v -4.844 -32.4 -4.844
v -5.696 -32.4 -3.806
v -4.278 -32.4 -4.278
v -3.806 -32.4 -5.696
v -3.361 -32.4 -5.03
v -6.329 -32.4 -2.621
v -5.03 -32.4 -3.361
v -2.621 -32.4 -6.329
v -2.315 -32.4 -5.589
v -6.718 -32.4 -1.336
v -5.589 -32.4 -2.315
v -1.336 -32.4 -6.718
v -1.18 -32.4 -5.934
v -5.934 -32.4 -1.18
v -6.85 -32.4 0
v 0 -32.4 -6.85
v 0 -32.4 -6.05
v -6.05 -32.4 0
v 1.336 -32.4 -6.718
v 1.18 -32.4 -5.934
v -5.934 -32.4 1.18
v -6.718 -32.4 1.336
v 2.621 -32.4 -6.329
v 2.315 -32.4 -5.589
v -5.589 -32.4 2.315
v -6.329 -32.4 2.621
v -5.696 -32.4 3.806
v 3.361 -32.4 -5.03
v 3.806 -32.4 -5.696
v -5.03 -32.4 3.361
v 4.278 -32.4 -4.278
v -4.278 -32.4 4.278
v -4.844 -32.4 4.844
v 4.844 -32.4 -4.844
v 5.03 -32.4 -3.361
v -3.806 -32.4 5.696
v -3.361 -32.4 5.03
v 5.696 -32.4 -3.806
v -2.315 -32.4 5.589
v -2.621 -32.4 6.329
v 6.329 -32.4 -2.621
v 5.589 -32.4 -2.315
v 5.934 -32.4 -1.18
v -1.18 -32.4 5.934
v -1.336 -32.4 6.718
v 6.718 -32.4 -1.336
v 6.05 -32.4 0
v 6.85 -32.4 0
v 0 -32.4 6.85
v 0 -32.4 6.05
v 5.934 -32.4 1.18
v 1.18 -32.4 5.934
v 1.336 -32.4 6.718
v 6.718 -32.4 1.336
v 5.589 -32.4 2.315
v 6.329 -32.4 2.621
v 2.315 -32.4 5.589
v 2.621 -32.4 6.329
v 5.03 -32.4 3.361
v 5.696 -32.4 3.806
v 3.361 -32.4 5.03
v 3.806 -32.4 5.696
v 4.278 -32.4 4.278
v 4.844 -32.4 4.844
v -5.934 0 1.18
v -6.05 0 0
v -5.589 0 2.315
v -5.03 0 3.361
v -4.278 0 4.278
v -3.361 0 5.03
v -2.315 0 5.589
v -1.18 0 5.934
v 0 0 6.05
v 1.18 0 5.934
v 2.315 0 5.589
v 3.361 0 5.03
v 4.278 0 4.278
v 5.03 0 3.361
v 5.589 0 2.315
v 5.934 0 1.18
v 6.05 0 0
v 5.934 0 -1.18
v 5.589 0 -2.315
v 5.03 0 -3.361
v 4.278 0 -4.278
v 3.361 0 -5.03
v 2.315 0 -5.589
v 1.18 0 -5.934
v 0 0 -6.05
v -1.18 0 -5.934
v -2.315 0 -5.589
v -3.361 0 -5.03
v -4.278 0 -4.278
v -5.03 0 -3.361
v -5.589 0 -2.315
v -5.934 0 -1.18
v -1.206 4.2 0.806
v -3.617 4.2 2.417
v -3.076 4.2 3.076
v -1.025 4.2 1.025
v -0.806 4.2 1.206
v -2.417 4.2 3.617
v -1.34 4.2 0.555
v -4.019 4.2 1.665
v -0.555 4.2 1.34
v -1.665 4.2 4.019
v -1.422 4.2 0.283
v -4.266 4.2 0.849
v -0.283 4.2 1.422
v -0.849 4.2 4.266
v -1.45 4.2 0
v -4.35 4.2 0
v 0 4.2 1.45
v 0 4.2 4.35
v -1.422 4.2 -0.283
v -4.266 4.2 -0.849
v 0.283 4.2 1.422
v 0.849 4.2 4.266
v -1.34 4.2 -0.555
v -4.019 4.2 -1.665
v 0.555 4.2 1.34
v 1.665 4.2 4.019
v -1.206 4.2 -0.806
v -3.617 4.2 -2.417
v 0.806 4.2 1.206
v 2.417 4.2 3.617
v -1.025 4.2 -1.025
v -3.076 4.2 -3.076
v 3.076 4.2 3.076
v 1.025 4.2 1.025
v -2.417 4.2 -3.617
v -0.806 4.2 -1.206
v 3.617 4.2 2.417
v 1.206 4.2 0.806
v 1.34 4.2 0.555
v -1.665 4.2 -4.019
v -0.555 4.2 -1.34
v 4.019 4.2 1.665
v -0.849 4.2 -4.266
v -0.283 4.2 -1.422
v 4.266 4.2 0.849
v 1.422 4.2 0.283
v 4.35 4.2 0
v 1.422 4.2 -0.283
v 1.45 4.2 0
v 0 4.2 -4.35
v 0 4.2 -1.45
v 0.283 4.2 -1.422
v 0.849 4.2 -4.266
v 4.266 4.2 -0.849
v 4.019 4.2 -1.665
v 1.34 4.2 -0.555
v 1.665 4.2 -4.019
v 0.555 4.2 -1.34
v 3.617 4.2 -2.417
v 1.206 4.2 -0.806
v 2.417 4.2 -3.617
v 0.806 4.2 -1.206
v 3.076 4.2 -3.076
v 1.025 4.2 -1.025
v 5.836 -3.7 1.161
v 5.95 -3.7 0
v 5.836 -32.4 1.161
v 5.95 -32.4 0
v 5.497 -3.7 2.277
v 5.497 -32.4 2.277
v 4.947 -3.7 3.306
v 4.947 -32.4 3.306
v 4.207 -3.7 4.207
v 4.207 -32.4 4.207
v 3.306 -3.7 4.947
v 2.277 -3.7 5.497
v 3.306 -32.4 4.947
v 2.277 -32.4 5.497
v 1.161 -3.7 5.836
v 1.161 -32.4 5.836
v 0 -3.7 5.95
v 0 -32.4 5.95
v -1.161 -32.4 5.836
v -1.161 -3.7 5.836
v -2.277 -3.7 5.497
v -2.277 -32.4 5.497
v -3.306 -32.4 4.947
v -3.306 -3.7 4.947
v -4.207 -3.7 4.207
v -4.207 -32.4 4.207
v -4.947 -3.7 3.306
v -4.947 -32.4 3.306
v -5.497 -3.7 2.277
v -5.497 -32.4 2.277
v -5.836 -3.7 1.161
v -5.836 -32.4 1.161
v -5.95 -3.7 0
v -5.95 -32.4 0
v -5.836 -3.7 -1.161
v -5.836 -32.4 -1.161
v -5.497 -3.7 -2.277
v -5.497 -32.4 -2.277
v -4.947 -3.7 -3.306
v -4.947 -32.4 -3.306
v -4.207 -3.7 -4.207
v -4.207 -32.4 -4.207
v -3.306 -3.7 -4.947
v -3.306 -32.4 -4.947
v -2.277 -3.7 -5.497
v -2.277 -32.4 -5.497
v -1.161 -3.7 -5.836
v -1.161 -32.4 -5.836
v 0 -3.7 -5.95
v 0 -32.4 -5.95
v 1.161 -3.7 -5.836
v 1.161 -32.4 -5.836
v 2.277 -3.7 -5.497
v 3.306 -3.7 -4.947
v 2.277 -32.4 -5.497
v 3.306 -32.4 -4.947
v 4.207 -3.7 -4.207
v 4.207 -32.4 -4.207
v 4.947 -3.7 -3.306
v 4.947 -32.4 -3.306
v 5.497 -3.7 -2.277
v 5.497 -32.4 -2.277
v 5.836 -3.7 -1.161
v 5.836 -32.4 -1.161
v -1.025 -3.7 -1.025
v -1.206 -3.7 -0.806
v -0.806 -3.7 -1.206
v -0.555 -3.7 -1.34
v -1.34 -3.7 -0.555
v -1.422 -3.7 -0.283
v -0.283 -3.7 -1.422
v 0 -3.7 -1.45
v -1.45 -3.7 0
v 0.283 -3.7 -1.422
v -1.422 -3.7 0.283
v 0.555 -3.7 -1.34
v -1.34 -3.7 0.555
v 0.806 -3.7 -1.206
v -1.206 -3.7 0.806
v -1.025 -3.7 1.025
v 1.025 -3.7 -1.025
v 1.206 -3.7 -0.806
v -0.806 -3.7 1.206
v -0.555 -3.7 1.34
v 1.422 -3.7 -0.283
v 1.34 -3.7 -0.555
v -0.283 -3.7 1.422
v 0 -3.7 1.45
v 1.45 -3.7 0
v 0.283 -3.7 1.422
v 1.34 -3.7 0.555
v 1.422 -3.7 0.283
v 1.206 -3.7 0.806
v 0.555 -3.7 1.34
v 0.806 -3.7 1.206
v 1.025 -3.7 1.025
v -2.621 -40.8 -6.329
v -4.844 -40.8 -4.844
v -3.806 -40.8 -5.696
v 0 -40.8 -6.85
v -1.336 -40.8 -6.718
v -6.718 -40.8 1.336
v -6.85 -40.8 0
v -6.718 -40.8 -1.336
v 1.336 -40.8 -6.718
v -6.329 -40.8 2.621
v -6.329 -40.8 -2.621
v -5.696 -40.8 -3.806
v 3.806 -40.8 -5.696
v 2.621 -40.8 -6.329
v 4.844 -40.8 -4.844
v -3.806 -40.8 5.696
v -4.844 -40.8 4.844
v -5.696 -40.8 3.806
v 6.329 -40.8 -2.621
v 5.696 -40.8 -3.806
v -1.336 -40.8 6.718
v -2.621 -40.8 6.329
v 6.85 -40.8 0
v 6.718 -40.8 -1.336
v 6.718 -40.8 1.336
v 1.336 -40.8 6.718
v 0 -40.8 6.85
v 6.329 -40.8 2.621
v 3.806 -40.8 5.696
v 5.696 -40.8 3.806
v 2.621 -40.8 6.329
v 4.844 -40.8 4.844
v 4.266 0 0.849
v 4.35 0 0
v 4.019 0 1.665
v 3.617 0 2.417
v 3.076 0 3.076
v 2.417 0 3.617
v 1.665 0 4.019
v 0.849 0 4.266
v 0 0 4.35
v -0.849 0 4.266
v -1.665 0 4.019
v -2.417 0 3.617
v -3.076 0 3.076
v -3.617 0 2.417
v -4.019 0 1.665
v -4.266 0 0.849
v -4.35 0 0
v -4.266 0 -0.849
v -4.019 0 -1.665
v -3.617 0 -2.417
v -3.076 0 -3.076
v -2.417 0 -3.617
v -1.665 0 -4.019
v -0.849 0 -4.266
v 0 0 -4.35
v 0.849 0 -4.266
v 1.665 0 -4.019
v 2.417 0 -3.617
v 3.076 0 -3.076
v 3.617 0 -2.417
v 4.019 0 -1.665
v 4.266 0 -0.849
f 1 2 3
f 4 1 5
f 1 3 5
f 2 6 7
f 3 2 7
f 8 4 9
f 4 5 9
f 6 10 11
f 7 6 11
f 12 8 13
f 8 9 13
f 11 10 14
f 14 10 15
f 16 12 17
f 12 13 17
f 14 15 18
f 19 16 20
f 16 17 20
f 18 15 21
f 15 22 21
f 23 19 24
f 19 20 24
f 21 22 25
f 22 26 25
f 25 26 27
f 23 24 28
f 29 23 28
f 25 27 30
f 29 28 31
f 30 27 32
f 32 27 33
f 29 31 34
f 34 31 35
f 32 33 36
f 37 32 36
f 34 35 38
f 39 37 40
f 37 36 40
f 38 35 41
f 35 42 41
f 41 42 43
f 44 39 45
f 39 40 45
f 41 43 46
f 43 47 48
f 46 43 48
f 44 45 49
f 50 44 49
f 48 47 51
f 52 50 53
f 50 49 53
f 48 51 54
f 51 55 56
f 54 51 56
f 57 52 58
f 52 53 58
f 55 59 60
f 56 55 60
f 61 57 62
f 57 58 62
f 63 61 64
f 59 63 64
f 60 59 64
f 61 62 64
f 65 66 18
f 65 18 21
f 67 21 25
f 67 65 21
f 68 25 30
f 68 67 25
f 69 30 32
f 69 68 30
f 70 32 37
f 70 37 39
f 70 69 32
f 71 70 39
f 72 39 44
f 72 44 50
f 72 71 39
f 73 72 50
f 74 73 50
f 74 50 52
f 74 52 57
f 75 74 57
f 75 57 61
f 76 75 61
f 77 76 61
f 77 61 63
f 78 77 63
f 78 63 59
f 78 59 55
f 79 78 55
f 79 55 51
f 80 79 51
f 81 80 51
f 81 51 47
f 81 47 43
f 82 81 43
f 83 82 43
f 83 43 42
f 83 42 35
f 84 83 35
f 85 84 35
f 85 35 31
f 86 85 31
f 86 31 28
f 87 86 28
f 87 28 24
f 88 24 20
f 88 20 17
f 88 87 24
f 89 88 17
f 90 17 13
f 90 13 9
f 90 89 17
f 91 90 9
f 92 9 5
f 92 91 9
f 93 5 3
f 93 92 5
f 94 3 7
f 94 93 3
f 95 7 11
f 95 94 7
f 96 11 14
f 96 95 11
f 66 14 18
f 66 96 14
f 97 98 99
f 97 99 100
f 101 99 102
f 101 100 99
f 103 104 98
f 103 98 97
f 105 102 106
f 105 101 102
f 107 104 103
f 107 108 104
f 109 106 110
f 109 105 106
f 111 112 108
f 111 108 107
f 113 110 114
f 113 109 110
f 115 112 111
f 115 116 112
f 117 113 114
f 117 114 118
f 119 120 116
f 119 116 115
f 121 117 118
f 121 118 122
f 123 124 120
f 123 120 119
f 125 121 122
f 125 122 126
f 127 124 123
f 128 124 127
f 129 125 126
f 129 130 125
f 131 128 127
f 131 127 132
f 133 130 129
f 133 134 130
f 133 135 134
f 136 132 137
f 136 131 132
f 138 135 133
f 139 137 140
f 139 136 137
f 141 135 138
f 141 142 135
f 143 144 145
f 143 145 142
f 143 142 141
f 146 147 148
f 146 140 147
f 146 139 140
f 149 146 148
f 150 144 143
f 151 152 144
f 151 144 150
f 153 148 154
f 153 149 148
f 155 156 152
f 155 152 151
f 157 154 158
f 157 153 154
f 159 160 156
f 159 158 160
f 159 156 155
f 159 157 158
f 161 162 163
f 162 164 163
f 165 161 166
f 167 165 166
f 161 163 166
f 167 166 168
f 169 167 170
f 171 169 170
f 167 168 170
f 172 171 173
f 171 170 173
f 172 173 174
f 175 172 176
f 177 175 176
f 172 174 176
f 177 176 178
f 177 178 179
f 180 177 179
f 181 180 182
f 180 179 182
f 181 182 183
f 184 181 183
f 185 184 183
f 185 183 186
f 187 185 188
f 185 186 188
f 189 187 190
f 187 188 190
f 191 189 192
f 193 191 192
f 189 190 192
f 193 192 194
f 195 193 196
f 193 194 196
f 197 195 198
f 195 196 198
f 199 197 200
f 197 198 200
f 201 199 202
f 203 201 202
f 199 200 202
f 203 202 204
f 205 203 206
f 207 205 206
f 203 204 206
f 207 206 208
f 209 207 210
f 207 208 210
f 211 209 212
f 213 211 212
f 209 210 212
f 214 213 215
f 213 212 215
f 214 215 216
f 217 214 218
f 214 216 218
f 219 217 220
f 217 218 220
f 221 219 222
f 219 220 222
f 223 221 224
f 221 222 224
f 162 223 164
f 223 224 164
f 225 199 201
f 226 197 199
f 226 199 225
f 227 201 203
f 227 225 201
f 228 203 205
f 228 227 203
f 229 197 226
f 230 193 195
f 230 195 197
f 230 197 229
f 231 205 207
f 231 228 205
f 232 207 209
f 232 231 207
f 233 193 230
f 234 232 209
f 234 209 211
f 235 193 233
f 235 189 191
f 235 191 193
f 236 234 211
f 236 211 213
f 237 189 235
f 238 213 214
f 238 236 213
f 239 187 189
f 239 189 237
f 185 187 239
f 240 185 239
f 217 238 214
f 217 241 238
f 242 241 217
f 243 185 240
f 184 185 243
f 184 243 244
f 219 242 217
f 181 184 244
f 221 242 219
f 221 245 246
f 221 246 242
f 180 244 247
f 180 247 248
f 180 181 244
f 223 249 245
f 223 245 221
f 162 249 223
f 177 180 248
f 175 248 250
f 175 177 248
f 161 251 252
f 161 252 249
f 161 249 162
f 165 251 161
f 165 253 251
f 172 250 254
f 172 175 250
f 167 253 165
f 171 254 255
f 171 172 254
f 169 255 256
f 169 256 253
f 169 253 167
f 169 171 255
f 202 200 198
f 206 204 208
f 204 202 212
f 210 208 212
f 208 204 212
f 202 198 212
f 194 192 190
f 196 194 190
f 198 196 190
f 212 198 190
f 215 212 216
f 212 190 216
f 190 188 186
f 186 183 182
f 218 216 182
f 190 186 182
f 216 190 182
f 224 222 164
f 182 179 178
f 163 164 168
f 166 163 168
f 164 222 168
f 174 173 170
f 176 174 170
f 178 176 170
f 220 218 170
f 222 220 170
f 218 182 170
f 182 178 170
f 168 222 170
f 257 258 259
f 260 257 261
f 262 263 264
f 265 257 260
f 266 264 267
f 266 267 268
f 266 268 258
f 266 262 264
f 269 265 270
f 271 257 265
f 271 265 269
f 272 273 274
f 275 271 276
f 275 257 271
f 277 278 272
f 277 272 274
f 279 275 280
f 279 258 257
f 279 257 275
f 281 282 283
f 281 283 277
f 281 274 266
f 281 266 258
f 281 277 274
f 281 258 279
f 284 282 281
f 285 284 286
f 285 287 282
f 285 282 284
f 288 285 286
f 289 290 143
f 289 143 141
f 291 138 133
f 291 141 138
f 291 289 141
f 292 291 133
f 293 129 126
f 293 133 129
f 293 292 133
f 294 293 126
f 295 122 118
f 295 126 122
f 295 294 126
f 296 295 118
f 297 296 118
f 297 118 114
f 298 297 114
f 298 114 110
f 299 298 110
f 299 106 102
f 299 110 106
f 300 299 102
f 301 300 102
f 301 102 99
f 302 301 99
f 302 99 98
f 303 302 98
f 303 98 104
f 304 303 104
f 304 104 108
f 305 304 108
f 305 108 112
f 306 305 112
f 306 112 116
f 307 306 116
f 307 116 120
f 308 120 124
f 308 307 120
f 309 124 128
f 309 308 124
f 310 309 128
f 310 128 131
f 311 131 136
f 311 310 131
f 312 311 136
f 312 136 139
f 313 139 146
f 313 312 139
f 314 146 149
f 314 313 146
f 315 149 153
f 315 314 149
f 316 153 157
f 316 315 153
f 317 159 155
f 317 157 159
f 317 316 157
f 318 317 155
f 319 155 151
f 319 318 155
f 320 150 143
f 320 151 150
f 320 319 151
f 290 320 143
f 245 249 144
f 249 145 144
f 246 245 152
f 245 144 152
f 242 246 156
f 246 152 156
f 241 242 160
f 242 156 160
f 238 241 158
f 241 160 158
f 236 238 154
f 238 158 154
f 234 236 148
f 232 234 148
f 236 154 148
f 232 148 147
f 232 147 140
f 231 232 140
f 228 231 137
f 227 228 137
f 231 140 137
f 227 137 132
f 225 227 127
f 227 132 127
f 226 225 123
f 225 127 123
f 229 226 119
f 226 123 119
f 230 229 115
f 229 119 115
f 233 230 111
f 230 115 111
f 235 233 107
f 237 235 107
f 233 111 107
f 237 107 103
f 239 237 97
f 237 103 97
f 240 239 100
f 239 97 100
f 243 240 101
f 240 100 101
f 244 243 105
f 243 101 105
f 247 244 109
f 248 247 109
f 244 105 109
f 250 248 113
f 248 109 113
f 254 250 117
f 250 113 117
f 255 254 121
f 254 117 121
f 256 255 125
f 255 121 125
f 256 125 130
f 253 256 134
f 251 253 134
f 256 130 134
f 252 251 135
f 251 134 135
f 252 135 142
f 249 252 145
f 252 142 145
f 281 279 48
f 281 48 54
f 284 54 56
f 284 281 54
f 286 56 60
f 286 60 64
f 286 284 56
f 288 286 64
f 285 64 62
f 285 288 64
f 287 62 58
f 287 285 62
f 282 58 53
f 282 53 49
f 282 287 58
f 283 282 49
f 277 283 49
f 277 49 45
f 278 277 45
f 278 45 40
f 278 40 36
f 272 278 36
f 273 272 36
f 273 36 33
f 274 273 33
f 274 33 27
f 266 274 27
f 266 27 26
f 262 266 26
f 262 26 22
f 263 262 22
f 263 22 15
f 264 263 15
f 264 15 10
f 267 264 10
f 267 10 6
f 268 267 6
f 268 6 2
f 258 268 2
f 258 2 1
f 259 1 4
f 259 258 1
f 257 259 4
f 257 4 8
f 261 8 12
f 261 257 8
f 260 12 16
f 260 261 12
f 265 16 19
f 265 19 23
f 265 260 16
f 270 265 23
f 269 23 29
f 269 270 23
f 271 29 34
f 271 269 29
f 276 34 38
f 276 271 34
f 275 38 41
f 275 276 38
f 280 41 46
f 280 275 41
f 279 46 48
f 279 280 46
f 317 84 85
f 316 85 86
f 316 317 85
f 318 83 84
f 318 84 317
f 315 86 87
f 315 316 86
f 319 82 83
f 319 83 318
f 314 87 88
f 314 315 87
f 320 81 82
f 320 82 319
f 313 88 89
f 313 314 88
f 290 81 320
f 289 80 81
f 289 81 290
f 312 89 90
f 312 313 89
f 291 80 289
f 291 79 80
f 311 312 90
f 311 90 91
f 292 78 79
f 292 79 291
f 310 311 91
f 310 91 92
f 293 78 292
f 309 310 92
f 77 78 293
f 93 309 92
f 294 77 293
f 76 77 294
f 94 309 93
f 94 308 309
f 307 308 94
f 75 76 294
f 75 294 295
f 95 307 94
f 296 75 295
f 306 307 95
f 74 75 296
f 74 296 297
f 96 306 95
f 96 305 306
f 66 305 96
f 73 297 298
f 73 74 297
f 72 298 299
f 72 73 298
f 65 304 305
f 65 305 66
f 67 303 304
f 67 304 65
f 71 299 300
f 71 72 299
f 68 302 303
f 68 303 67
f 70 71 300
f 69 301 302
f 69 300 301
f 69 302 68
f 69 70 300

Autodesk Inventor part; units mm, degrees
ref_plane "YZ Plane" through (0, 0, 0) normal (1, 0, 0) x (0, 1, 0)
ref_plane "XZ Plane" through (0, 0, 0) normal (0, 1, 0) x (-1, 0, 0)
ref_plane "XY Plane" through (0, 0, 0) normal (0, 0, 1) x (1, 0, 0)
sketch "Boceto1" plane through (0, 0, 0) normal (0, 1, 0) x (-1, 0, 0)
  circle A0 centre (0, 0) radius 6.05
  dimension "d0" = 12.1
extrude "Extrusión1" add sketch "Boceto1" against normal blind 32.4
sketch "Boceto2" plane through (0, 0, 0) normal (0, 1, 0) x (1, 0, 0)
  circle A0 centre (0, 0) radius 4.35
  dimension "d3" = 8.7
extrude "Extrusión2" add sketch "Boceto2" along normal blind 4.2
thread "Rosca1" size "M9x1.25" class "6g" standard "ANSI Metric M Profile" full length
sketch "Boceto3" plane through (0, -32.4, 0) normal (0, -1, 0) x (1, 0, 0)
  circle A0 centre (0, 0) radius 6.9
  dimension "d8" = 13.8
sketch "Boceto4" plane through (0, -32.4, 0) normal (0, -1, 0) x (1, 0, 0)
  circle A0 centre (0, 0) radius 5.95
  dimension "d9" = 11.9
extrude "Extrusión3" cut sketch "Boceto4" against normal blind 28.7
sketch "Boceto5" plane through (0, -32.4, 0) normal (0, -1, 0) x (1, 0, 0)
  point P0 (0, 0)
extrude "Extrusión4" add sketch "Boceto3" along normal blind 8.4
sketch "Boceto6" plane through (0, 4.2, 0) normal (0, 1, 0) x (1, 0, 0)
  circle A0 centre (0, 0) radius 1.45
  dimension "d14" = 2.9
extrude "Extrusión5" cut sketch "Boceto6" against normal blind 20
sketch "Boceto7" plane through (0, -40.8, 0) normal (0, -1, 0) x (1, 0, 0)
  circle A0 centre (0, 0) radius 6.85
  circle A1 centre (0, 0) radius 6.9
  dimension "d17" = 13.7
  dimension "d18" = 13.8
extrude "Extrusión6" cut sketch "Boceto7" against normal blind 20
properties part number "Piston(Deposito_deAceite)" material "Plástico ABS"
